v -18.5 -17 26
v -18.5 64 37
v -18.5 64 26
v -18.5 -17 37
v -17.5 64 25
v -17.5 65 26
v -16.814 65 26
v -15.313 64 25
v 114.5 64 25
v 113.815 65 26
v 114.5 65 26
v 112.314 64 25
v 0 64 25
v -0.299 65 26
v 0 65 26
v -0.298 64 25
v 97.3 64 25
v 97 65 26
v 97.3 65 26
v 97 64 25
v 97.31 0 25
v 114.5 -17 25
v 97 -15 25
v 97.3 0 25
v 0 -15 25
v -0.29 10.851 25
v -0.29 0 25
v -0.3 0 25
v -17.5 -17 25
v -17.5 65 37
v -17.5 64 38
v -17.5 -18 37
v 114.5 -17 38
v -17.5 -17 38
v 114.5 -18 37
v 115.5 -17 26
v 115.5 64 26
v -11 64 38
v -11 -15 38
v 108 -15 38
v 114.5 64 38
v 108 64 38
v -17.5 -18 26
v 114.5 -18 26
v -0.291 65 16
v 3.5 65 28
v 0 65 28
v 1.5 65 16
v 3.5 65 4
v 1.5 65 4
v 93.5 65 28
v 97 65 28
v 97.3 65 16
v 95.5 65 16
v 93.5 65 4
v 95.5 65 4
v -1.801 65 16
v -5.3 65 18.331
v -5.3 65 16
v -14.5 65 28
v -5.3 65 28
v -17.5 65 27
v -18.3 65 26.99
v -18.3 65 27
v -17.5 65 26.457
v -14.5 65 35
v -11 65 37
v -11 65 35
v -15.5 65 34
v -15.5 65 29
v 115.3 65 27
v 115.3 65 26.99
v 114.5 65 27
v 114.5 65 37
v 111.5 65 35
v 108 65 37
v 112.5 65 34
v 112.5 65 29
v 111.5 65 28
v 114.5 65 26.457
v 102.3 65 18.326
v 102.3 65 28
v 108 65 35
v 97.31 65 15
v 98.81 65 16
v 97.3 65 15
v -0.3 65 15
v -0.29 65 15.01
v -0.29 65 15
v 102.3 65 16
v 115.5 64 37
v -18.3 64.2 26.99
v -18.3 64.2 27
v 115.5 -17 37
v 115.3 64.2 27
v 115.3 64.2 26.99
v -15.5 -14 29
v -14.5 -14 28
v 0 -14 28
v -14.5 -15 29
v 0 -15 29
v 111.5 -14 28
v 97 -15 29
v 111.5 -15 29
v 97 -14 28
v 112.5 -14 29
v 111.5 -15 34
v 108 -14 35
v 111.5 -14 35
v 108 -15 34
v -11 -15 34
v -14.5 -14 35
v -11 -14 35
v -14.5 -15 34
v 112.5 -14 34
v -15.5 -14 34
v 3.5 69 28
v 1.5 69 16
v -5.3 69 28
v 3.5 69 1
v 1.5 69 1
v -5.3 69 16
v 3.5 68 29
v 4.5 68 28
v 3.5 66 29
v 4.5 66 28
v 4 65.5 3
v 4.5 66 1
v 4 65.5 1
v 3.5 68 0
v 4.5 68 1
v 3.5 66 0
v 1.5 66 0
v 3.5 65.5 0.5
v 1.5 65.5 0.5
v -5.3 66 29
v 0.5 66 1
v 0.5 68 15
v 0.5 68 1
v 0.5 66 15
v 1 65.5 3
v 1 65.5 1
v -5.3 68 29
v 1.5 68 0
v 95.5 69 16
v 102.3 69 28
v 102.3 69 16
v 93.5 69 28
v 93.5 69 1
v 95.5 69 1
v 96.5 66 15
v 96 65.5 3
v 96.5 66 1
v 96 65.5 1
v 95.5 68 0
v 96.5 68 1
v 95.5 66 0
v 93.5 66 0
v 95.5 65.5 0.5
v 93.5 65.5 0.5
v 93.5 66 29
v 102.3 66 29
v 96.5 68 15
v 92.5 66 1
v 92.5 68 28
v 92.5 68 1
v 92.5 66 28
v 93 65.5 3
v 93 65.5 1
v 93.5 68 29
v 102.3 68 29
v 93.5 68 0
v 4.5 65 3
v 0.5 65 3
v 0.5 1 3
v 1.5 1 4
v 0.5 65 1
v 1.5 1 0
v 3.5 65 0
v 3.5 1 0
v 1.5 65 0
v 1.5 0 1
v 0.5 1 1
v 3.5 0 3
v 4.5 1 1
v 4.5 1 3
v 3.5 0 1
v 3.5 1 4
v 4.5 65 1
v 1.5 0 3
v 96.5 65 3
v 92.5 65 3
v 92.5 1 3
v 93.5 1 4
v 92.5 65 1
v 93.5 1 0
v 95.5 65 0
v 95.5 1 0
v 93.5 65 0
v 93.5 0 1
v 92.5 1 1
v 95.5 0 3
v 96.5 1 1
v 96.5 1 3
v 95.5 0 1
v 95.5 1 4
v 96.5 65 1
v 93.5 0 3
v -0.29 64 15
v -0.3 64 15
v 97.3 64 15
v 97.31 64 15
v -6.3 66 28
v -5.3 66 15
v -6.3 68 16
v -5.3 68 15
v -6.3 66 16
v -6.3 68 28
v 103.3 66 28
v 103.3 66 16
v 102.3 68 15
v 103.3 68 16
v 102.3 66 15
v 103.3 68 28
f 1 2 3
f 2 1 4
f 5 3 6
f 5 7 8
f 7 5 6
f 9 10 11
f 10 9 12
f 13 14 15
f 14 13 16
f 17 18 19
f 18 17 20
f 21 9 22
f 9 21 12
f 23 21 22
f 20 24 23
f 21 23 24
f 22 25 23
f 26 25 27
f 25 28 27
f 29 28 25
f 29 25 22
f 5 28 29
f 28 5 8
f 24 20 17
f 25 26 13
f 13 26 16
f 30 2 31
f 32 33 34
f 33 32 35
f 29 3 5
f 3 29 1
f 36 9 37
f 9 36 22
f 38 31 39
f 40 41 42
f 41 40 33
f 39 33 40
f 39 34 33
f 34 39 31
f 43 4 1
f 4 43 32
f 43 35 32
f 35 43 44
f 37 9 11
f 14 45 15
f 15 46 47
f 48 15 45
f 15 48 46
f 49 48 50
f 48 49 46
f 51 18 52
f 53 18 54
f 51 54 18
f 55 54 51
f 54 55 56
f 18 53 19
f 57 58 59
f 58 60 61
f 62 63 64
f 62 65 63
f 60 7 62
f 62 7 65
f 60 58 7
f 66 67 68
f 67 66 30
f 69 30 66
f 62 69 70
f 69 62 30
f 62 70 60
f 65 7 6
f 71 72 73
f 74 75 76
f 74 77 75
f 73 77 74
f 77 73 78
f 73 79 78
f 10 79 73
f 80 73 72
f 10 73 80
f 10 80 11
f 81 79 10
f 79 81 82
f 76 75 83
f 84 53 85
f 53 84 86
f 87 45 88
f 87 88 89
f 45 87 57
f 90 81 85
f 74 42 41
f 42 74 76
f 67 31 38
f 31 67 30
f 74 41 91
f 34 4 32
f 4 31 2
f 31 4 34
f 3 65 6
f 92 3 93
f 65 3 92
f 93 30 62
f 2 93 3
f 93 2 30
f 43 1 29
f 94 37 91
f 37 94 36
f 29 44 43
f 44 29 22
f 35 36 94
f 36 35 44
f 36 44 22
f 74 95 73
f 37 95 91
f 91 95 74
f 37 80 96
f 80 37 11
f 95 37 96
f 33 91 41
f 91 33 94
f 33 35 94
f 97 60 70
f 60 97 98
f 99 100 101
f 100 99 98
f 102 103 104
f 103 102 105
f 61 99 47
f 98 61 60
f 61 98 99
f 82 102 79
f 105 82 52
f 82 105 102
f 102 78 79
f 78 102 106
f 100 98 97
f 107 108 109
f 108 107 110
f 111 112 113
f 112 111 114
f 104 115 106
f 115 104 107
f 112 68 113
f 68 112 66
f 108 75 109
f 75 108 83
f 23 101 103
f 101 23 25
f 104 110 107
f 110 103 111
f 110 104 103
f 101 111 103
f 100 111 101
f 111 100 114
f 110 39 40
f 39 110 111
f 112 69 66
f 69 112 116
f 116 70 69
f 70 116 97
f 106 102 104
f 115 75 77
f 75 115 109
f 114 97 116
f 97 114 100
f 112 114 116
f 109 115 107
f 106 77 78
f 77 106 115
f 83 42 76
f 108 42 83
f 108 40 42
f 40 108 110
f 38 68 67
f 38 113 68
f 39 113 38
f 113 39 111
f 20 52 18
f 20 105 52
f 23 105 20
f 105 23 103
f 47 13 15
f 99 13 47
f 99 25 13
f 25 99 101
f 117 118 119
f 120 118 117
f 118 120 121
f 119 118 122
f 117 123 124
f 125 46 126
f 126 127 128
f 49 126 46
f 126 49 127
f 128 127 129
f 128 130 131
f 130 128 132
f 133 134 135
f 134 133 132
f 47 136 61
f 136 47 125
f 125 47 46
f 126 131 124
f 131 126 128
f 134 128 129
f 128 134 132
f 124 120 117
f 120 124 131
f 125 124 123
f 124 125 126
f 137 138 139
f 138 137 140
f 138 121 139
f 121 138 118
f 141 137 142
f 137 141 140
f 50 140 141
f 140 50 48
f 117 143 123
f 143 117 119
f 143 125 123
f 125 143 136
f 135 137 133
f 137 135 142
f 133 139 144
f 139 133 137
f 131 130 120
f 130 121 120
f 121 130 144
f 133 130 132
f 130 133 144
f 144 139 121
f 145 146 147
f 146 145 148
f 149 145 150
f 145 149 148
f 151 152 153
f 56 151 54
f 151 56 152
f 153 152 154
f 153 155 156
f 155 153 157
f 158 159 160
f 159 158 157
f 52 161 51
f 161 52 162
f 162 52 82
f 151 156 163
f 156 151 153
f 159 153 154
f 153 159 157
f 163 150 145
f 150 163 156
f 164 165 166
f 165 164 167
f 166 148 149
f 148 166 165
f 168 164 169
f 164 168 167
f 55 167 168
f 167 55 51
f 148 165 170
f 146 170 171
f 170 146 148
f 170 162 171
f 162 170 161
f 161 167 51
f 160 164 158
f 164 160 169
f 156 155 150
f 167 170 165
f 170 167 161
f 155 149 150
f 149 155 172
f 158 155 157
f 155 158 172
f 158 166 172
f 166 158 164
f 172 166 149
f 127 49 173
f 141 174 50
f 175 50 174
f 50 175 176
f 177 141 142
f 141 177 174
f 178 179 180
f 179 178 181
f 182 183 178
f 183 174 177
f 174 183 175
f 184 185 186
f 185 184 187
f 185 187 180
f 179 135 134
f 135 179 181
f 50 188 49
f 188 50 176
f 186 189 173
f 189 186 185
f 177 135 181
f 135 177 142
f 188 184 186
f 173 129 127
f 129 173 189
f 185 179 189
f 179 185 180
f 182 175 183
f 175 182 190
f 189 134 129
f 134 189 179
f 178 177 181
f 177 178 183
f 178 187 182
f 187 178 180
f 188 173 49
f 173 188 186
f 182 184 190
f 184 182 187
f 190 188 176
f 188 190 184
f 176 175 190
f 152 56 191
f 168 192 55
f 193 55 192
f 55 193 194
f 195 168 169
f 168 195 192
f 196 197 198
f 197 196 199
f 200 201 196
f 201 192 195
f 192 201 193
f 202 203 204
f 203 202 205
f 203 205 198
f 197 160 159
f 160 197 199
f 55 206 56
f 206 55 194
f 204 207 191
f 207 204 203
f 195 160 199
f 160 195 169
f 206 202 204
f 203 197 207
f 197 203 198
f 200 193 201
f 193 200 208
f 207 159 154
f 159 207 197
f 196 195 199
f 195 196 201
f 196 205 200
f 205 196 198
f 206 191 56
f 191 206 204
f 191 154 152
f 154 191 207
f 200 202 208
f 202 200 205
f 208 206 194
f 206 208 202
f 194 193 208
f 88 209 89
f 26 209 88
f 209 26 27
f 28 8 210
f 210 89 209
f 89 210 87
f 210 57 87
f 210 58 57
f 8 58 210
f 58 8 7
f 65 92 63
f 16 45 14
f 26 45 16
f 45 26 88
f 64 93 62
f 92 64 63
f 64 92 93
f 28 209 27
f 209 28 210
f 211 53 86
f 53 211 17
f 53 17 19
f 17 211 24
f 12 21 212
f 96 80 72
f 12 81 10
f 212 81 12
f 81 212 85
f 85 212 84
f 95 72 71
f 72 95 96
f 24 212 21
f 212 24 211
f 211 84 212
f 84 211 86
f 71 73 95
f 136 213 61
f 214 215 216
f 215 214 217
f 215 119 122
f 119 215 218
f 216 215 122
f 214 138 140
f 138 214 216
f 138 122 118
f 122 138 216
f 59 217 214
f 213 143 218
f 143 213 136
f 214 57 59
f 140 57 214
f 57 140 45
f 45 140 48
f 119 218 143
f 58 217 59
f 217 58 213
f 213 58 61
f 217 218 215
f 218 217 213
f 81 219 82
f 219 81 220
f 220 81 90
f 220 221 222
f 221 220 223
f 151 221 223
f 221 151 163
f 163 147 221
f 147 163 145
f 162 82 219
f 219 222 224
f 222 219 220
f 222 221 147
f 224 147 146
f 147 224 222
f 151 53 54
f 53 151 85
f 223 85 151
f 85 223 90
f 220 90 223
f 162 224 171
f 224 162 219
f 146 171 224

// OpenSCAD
// ============================================================
// PRINT PROFILE
// ------------------------------------------------------------
// Material:    PETG Basic — matches PhoneHolder; this part clips onto
//               that holder and both should tolerate the same environment.
// Nozzle:      0.4mm.
// Quality:     0.20mm Standard.
// Infill:      20% grid — lighter load than the primary (no screw pull-out
//               force), but the two corner brackets are a stress
//               concentration, so don't drop below this without testing.
// Orientation: print with the back face (the pocket wall that mates flush
//               against PhoneHolder's front face, i.e. low Z) flat on
//               the bed. The corner brackets' hook tabs and guide tabs then
//               overhang forward/outward in a printable direction without
//               support.
// Known trade-off: hanging this off PhoneHolder's top edge adds
//               forward/downward load to that holder's own mounting
//               screws (PhoneHolder attaches via a flat back-wall
//               plate to a car mount arm, not a literal wall — see
//               PhoneHolder's own header comment on screw pull-out
//               orientation) — this makes that existing marginal axis
//               worse. Not a blocker, just something to be aware of.
// ============================================================

/* [Phone Pocket] */
pocket_width = 128;    // [50:1:200]
pocket_depth = 7;      // [3:0.5:20]
pocket_height = 80;    // [40:1:150]
wall_thickness = 3;    // [1:0.5:8]
chamfer = 1;           // [0:0.25:3]

/* [Primary Holder Reference Geometry - mirrors PhoneHolder, update manually if that file changes] */
primary_width = 97;        // phone_width(87) + 2*wall_thickness(5) in PhoneHolder
primary_height = 65;       // phone_height(70) - wall_thickness(5) in PhoneHolder
primary_depth = 25;        // phone_depth(15) + 2*wall_thickness(5) in PhoneHolder
primary_wing_width = 5;    // solid margin outside the primary's pocket/screen cutouts (= its own wall_thickness)

/* [front window additional width] */
open_width_adjust = 11;

/* [Clip / Hook] */
hook_tab_width = 4;        // [2:0.5:5] must stay < primary_wing_width
hook_bearing_depth = 25;   // [5:1:24]
hook_thickness = 4;        // [2:0.5:8]
guide_wall_thickness = 6;  // [1:0.5:10] X-thickness at the top, near the hook attachment point — the guide's thickest point
guide_tab_depth = 10;      // [5:1:24] Z-depth of hook_guide_connector's own reach, bridging hook_tab and guide_tab
guide_tip_depth = 0;       // [0:0.5:10] how far back (toward the primary) the bottom point reaches, must stay < guide_tab_depth
guide_clearance = 0.3;     // [0.1:0.05:1]

/* [Hidden] */
outer_width = pocket_width + 2*wall_thickness;
outer_depth = pocket_depth + 2*wall_thickness;
outer_height = pocket_height + wall_thickness;
offset_x = (outer_width - primary_width) / 2;
box_x0 = -offset_x;
box_y0 = primary_height - outer_height;
box_y1 = primary_height;
box_z0 = primary_depth;
box_z1 = primary_depth + outer_depth;
back_wall_overlap_z1 = box_z0 + 2; // 2mm past the box's own chamfered front face, for clean unions
guide_tip_epsilon = 0.01; // near-zero size standing in for a true point in guide_tab's hull(), avoids degenerate zero-size geometry
chamfered_overlap_z1 = back_wall_overlap_z1 + 2*chamfer; // extra margin for hook_tab/hook_guide_connector: their own corner-chamfer would otherwise eat into the overlap that back_wall_overlap_z1 is meant to guarantee

// octahedron used as the minkowski "brush" that chamfers every edge of a cube by 45 degrees
module octahedron(r) {
    polyhedron(
        points = [
            [ r, 0, 0], [-r, 0, 0],
            [ 0, r, 0], [ 0,-r, 0],
            [ 0, 0, r], [ 0, 0,-r]
        ],
        faces = [
            [0,2,4],[2,1,4],[1,3,4],[3,0,4],
            [0,3,5],[3,1,5],[1,2,5],[2,0,5]
        ]
    );
}

// drop-in replacement for cube(size) that chamfers all 12 edges by `c`
module chamfered_cube(size, c = chamfer) {
    minkowski() {
        translate([c, c, c])
        cube([size[0]-2*c, size[1]-2*c, size[2]-2*c]);
        octahedron(c);
    }
}

pocket_x0 = box_x0 + wall_thickness;
pocket_x1 = box_x0 + outer_width - wall_thickness;
pocket_y0 = box_y0 + wall_thickness;
pocket_y1 = box_y1 + 2; // overshoot past the box's own top so the opening is fully clear
pocket_z0 = box_z0 + wall_thickness;
pocket_z1 = box_z1 - wall_thickness;

// Open-frame cuts: both the front wall (viewer-facing, high Z) and the back
// wall (facing the primary, low Z) are removed only where they'd sit over
// the primary's own footprint (X 0..primary_width) — front so the unfolded
// phone's screen isn't covered there, back so the primary stays usable
// through the clip. Outside that width (the margins wider than the
// primary, where the clip brackets attach) both walls stay closed, giving
// the hook/guide brackets a solid box to root into instead of a thin
// sliver. The two side rails (X box_x0..pocket_x0 and pocket_x1..box_x1)
// and the bottom wall are untouched by either cut and stay fully closed
// regardless — these are what actually grip the phone's edges and stop it
// sliding out.
front_open_x0 = -1*open_width_adjust;
front_open_x1 = primary_width+open_width_adjust;
front_open_y0 = pocket_y0;
front_open_y1 = pocket_y1;
front_open_z0 = box_z1 - wall_thickness - 1;
front_open_z1 = box_z1 + 1;

back_open_x0 = 0;
back_open_x1 = primary_width;
back_open_y0 = pocket_y0;
back_open_y1 = pocket_y1;
back_open_z0 = box_z0 - 1;
back_open_z1 = box_z0 + wall_thickness + 1;

// A block resting on one of the primary's solid top-corner "wings"
// (Y = primary_height), extending back along the wing in Z and rising
// hook_thickness above it. Overlaps 2mm past the box's own front face
// (back_wall_overlap_z1) into solid material for a clean union — same
// overlap convention PhoneHolder uses for its chamfer wedges.
// Chamfered (same octahedron/minkowski trick as the rest of the model)
// for a softened, finished look instead of sharp box edges.
module hook_tab(x0) {
    translate([x0, primary_height, primary_depth - hook_bearing_depth])
        chamfered_cube([hook_tab_width, hook_thickness, hook_bearing_depth + (chamfered_overlap_z1 - primary_depth)]);
}

// Connects to the far end of hook_tab (Z = primary_depth - hook_bearing_depth,
// its deepest reach) and drops straight down the Y axis to Y=0, the bottom
// of the primary — together with hook_tab's own horizontal run along Z,
// this forms an L-shaped hook profile (seen in the Y-Z plane). Same X range
// as hook_tab (x0 to x0+hook_tab_width) so it reads as one continuous beam
// bending downward, not a piece offset to the side. Overlaps 1mm into
// hook_tab's own Y range for a clean chamfered union (same reasoning as
// chamfered_overlap_z1 elsewhere).
module hook_drop(x0) {
    translate([x0, 0, primary_depth - hook_bearing_depth])
        chamfered_cube([hook_tab_width, primary_height + 1, hook_thickness]);
}

// A thin wall just outside one of the primary's side faces (X=0 or
// X=primary_width plane), with guide_clearance gap for a slip fit.
// near_x is the edge closest to the primary (fixed — this is the actual
// guiding contact surface, at guide_clearance off the primary's true edge).
// outward_sign (-1 for the left tab, +1 for the right) is which way is
// "away from the primary". Runs the full length of the primary's side edge
// (Y=0, its bottom, up to Y=primary_height, where it meets the hook) for
// lateral stability along the whole side, not just near the top.
//
// Wedge shape, tapered along two axes at once, thickest where it blends
// into this part's own solid mass and thinnest where it reaches out to the
// primary:
// - Y (top to bottom): full width at the top, near hook_guide_connector,
//   down to a genuine point at Y=0.
// - Z (at the top only): the extra outward width is concentrated where the
//   guide meets the solid back-wall block (Z near back_wall_overlap_z1,
//   already thick/closed there, see front_open/back_open above) — a
//   reinforcement rib should be thickest where it blends into the mass
//   it's reinforcing. It tapers down to a thin edge at Z = top_z0, the far
//   reach alongside the primary's own side face, since that edge only
//   needs to touch the primary for guiding, not carry bulk.
// This guide is lateral/twist stability only, not the hook — hook_tab
// (above) is a flat lip, and stays one.
// All three anchors below touch X=near_x somewhere (the bottom point
// entirely, the top-narrow point entirely, and the top-wide box's own
// inner edge), so the convex hull's boundary at X=near_x — the plane that
// actually presses against the primary — stays one continuous flat
// triangular face for the whole part, meeting the top-wide face at a
// single clean 90-degree edge, with every other face sloping smoothly
// away to the bottom point instead of stepping through extra edges.
module guide_tab(near_x, outward_sign) {
    top_z0 = primary_depth - guide_tab_depth; // far reach alongside the primary's own side face — thin edge
    tip_z0 = primary_depth - guide_tip_depth; // near the solid back-wall block
    z1 = back_wall_overlap_z1;

    top_far_x = near_x + outward_sign * guide_wall_thickness;

    hull() {
        // bottom point (Y=0), flush with near_x, near the solid back-wall block
        translate([near_x, 0, tip_z0])
            cube([guide_tip_epsilon, guide_tip_epsilon, max(z1-tip_z0, guide_tip_epsilon)]);

        // top-narrow: tapered to near_x (zero extra width), at the far reach alongside the primary's side face
        translate([near_x, primary_height - 1, top_z0])
            cube([guide_tip_epsilon, 1, guide_tip_epsilon]);

        // top-wide: full outward width, where it blends into the solid back-wall block
        translate([min(near_x, top_far_x), primary_height - 1, z1 - guide_tip_epsilon])
            cube([abs(top_far_x - near_x), 1, guide_tip_epsilon]);
    }
}

// The back-open cut (above) removes all frame material behind the hook
// tabs, since they sit over the primary's width — without this bridge each
// hook_tab would be a structurally disconnected island. This rib spans from
// the guide_tab's outer edge to the hook_tab's inner edge, overlapping both
// in Z, at the same height as hook_tab (Y = primary_height to
// primary_height + hook_thickness). It sits entirely above the primary's
// own top edge (Y > primary_height), so it doesn't cover the primary either.
// Chamfered like hook_tab, for the same softened, finished look.
module hook_guide_connector(x0, x1) {
    translate([x0, primary_height, primary_depth - guide_tab_depth])
        chamfered_cube([x1-x0, hook_thickness, guide_tab_depth + (chamfered_overlap_z1 - primary_depth)]);
}

union() {
    difference() {
        translate([box_x0, box_y0, box_z0])
            color("coral")
            chamfered_cube([outer_width, outer_height, outer_depth]);

        translate([pocket_x0, pocket_y0, pocket_z0])
            color("grey")
            chamfered_cube([pocket_x1-pocket_x0, pocket_y1-pocket_y0, pocket_z1-pocket_z0]);

        translate([front_open_x0, front_open_y0, front_open_z0])
            color("grey")
            cube([front_open_x1-front_open_x0, front_open_y1-front_open_y0, front_open_z1-front_open_z0]);

        translate([back_open_x0, back_open_y0, back_open_z0])
            color("grey")
            cube([back_open_x1-back_open_x0, back_open_y1-back_open_y0, back_open_z1-back_open_z0]);
    }

    color("green") hook_tab(0.5);                                       // left, X in [0.5, 4.5]
    color("green") hook_tab(primary_width - hook_tab_width - 0.5);      // right, X in [92.5, 96.5]

    color("red") hook_drop(0.5);                                        // left hook drop, X in [0.5, 4.5]
    color("red") hook_drop(primary_width - hook_tab_width - 0.5);       // right hook drop, X in [92.5, 96.5]

    // left: near edge at X=-guide_clearance (just outside X=0), tapering outward toward more negative X
    color("blue") guide_tab(-guide_clearance, -3);
    // right: near edge at X=primary_width+guide_clearance (just outside X=primary_width), tapering outward toward more positive X
    color("blue") guide_tab(primary_width + guide_clearance, 3);

    // bridges connecting each side's hook_tab to its guide_tab (see module comment above)
    color("purple") hook_guide_connector(-(guide_wall_thickness + guide_clearance), 0.5 + hook_tab_width);
    color("purple") hook_guide_connector(primary_width - hook_tab_width - 0.5, primary_width + guide_clearance + guide_wall_thickness);
}
